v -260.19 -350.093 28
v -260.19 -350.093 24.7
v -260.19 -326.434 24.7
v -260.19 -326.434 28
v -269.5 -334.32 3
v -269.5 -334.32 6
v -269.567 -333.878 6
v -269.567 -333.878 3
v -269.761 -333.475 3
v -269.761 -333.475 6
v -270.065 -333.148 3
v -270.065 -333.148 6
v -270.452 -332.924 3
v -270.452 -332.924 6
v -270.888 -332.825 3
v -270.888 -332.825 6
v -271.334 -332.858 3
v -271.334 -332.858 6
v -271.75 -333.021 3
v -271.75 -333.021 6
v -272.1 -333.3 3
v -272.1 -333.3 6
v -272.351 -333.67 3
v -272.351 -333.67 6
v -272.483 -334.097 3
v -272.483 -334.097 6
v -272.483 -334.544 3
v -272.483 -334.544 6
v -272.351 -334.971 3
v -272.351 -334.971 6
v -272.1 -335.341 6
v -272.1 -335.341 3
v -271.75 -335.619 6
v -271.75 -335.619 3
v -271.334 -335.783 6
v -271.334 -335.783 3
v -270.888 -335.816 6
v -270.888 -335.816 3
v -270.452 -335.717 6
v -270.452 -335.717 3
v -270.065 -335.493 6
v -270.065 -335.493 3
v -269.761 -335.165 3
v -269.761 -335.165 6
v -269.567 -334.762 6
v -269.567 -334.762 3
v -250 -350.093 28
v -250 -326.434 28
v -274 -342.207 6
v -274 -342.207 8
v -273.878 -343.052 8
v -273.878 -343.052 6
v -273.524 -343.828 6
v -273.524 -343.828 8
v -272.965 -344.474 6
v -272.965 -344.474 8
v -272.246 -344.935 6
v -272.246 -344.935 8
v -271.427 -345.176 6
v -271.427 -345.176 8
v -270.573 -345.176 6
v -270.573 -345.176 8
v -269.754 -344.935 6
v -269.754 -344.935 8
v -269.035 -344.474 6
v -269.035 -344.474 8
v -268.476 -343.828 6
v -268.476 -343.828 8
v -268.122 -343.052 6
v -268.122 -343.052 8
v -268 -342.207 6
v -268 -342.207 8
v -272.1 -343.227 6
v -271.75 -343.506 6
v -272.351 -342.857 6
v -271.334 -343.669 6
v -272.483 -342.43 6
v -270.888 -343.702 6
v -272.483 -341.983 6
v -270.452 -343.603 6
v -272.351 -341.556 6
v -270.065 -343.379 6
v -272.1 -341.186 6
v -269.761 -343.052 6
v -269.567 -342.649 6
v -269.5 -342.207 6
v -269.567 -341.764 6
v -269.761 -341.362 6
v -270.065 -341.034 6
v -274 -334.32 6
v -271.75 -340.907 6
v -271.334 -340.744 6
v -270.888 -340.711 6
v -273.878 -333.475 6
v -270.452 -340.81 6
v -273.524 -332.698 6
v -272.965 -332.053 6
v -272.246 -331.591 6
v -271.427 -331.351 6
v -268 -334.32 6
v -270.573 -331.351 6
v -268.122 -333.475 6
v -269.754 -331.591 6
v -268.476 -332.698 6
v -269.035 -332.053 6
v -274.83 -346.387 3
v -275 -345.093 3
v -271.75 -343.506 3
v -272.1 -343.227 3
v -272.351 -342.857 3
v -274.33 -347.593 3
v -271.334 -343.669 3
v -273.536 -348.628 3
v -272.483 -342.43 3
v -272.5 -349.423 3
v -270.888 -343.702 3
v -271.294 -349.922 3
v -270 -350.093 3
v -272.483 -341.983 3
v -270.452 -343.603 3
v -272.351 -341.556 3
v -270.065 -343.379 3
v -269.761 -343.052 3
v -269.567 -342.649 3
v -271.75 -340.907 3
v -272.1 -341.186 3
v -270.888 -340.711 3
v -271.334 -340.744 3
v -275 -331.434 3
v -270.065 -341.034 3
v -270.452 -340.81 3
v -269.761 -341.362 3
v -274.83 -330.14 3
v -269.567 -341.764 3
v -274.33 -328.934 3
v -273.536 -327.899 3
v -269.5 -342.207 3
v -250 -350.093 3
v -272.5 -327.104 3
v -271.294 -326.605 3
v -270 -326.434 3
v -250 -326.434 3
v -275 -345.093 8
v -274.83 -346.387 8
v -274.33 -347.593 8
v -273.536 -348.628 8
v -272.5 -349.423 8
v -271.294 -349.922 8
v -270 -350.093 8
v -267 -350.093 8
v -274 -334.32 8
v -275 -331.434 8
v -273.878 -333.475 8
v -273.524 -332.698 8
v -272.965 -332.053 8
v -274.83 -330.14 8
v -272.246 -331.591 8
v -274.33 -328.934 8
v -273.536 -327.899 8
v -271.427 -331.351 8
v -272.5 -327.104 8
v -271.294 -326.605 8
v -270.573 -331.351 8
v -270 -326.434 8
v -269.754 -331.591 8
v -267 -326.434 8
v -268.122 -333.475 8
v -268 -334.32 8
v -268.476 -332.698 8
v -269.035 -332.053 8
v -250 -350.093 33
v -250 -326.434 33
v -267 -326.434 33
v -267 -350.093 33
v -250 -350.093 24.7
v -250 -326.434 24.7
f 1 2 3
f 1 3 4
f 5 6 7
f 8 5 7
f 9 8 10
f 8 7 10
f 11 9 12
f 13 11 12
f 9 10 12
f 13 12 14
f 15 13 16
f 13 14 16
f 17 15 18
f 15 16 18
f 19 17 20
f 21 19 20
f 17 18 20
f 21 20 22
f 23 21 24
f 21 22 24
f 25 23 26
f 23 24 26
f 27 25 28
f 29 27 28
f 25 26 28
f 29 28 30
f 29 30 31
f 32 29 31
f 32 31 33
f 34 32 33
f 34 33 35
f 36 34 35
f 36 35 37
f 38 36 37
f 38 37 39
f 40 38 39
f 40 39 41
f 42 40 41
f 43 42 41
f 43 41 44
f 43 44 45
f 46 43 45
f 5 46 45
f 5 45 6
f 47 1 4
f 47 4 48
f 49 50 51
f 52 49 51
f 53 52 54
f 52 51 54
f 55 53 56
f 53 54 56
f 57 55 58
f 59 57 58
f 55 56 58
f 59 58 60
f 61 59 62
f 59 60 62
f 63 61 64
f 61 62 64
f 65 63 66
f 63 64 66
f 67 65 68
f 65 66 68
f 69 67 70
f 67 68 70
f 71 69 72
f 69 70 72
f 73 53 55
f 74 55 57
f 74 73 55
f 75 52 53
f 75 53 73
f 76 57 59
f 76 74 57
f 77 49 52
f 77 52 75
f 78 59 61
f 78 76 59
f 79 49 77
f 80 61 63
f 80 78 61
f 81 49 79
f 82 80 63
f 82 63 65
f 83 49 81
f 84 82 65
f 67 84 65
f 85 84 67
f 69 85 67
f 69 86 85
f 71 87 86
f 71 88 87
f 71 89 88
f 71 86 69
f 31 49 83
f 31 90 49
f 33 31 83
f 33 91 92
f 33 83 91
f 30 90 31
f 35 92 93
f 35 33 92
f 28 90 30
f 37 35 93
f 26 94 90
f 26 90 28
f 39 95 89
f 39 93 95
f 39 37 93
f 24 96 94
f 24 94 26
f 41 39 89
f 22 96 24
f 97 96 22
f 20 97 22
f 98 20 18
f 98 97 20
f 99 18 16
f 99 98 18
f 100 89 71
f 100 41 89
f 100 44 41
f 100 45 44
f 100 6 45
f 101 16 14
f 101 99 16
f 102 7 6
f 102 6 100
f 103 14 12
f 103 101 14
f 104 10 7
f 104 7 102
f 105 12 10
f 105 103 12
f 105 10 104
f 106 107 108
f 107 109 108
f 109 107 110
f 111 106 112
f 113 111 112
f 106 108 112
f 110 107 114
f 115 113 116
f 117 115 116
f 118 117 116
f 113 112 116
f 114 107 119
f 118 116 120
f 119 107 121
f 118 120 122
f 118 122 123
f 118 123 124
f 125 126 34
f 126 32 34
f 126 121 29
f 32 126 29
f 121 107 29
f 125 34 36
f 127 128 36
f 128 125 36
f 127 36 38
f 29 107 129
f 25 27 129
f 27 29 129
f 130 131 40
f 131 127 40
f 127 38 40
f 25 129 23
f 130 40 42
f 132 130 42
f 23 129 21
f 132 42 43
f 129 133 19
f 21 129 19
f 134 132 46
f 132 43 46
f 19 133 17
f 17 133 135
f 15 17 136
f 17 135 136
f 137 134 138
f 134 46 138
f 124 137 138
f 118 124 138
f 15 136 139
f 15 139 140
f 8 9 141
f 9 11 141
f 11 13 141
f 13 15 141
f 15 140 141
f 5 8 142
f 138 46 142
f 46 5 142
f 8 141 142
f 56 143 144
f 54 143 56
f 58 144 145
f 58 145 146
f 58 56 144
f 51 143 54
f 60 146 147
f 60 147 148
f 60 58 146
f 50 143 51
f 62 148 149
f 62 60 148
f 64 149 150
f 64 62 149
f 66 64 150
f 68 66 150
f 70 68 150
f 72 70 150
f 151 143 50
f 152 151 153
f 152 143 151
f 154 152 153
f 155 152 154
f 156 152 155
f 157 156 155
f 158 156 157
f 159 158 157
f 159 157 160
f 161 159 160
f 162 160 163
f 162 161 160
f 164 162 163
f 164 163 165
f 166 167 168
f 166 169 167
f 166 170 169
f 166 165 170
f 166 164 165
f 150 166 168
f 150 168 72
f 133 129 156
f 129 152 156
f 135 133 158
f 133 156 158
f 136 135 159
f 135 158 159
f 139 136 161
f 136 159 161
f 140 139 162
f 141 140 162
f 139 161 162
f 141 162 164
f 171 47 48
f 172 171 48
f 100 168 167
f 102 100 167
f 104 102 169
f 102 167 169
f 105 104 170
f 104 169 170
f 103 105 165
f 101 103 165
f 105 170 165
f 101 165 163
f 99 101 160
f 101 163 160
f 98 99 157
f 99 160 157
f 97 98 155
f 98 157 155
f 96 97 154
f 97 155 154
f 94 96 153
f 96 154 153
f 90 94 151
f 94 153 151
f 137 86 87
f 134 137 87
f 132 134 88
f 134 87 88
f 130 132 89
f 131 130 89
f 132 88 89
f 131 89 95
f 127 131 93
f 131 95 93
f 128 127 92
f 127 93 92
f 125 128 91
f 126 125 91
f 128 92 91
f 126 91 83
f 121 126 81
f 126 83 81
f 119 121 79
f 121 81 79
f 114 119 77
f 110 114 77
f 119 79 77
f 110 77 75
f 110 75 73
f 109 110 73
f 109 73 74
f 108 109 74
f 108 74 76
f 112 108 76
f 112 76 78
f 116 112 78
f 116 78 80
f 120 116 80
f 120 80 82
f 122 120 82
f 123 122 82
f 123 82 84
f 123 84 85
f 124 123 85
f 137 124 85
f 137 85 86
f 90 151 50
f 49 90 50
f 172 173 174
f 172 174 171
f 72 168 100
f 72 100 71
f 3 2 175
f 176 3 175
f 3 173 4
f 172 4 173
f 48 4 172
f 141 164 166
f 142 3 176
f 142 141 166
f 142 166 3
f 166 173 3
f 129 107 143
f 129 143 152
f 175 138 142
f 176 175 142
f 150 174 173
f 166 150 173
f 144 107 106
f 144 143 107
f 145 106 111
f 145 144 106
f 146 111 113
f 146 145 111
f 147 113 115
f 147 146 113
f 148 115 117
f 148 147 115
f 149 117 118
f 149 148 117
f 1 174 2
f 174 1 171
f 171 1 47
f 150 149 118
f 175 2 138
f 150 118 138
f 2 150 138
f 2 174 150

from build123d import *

# Parameters (mm, degrees)
SKETCH010_W     = 25
SKETCH010_H     = 23.658539
PAD002_DEPTH    = 30
SKETCH011_W     = 17.384644
SKETCH011_H     = 39.730011
POCKET008_DEPTH = 25
SKETCH012_R     = 1.5
POCKET009_DEPTH = 5.001
POCKET010_DEPTH = 2
SKETCH014_W     = 12.358228
SKETCH014_H     = 3.3
POCKET011_DEPTH = 23.659539
FILLET004_R     = 5


with BuildPart() as part:
    # Sketch010 → Pad002 (new body)
    with BuildSketch(Plane.XY):
        with Locations((-262.5, -338.263442)):
            Rectangle(SKETCH010_W, SKETCH010_H)
    extrude(amount=PAD002_DEPTH)

    # Sketch011 (on Face6 of Pad002) → Pocket008 (cut)
    with BuildSketch(Plane.XY.offset(30)):
        with Locations((-275.692322, -336.624282)):
            Rectangle(SKETCH011_W, SKETCH011_H)
    extrude(amount=-POCKET008_DEPTH, mode=Mode.SUBTRACT)

    # Sketch012 (on Face6 of Pocket008) → Pocket009 (cut, through all)
    with BuildSketch(Plane.XY.offset(5)):
        with Locations((-271, -334.320353)):
            Circle(SKETCH012_R)
        with Locations((-271, -342.206532)):
            Circle(SKETCH012_R)
    extrude(amount=-POCKET009_DEPTH, mode=Mode.SUBTRACT)

    # Sketch013 (on Face6 of Pocket009) → Pocket010 (cut)
    with BuildSketch(Plane.XY.offset(5)):
        with BuildLine():
            ThreePointArc((-268, -334.320353), (-271, -331.320353), (-274, -334.320353))
            Line((-274, -334.320353), (-274, -342.206532))
            ThreePointArc((-274, -342.206532), (-271, -345.206532), (-268, -342.206532))
            Line((-268, -334.320353), (-268, -342.206532))
        make_face()
    extrude(amount=-POCKET010_DEPTH, mode=Mode.SUBTRACT)

    # Sketch014 (on Face1 of Pocket010) → Pocket011 (cut, through all)
    with BuildSketch(Plane.XZ.offset(350.092712)):
        with Locations((-254.010886, 23.35)):
            Rectangle(SKETCH014_W, SKETCH014_H)
    extrude(amount=-POCKET011_DEPTH, mode=Mode.SUBTRACT)

    # Fillet004
    fillet004_edges = [part.edges().sort_by_distance(p)[0] for p in [
        (-275, -326.434173, 2.5),
        (-275, -350.092712, 2.5),
    ]]
    fillet(fillet004_edges, radius=FILLET004_R)


with BuildPart() as part_1:
    # Body002 placement: moved
    add(part.part.moved(Location((0, 0, 3))))


solid = part_1.part
